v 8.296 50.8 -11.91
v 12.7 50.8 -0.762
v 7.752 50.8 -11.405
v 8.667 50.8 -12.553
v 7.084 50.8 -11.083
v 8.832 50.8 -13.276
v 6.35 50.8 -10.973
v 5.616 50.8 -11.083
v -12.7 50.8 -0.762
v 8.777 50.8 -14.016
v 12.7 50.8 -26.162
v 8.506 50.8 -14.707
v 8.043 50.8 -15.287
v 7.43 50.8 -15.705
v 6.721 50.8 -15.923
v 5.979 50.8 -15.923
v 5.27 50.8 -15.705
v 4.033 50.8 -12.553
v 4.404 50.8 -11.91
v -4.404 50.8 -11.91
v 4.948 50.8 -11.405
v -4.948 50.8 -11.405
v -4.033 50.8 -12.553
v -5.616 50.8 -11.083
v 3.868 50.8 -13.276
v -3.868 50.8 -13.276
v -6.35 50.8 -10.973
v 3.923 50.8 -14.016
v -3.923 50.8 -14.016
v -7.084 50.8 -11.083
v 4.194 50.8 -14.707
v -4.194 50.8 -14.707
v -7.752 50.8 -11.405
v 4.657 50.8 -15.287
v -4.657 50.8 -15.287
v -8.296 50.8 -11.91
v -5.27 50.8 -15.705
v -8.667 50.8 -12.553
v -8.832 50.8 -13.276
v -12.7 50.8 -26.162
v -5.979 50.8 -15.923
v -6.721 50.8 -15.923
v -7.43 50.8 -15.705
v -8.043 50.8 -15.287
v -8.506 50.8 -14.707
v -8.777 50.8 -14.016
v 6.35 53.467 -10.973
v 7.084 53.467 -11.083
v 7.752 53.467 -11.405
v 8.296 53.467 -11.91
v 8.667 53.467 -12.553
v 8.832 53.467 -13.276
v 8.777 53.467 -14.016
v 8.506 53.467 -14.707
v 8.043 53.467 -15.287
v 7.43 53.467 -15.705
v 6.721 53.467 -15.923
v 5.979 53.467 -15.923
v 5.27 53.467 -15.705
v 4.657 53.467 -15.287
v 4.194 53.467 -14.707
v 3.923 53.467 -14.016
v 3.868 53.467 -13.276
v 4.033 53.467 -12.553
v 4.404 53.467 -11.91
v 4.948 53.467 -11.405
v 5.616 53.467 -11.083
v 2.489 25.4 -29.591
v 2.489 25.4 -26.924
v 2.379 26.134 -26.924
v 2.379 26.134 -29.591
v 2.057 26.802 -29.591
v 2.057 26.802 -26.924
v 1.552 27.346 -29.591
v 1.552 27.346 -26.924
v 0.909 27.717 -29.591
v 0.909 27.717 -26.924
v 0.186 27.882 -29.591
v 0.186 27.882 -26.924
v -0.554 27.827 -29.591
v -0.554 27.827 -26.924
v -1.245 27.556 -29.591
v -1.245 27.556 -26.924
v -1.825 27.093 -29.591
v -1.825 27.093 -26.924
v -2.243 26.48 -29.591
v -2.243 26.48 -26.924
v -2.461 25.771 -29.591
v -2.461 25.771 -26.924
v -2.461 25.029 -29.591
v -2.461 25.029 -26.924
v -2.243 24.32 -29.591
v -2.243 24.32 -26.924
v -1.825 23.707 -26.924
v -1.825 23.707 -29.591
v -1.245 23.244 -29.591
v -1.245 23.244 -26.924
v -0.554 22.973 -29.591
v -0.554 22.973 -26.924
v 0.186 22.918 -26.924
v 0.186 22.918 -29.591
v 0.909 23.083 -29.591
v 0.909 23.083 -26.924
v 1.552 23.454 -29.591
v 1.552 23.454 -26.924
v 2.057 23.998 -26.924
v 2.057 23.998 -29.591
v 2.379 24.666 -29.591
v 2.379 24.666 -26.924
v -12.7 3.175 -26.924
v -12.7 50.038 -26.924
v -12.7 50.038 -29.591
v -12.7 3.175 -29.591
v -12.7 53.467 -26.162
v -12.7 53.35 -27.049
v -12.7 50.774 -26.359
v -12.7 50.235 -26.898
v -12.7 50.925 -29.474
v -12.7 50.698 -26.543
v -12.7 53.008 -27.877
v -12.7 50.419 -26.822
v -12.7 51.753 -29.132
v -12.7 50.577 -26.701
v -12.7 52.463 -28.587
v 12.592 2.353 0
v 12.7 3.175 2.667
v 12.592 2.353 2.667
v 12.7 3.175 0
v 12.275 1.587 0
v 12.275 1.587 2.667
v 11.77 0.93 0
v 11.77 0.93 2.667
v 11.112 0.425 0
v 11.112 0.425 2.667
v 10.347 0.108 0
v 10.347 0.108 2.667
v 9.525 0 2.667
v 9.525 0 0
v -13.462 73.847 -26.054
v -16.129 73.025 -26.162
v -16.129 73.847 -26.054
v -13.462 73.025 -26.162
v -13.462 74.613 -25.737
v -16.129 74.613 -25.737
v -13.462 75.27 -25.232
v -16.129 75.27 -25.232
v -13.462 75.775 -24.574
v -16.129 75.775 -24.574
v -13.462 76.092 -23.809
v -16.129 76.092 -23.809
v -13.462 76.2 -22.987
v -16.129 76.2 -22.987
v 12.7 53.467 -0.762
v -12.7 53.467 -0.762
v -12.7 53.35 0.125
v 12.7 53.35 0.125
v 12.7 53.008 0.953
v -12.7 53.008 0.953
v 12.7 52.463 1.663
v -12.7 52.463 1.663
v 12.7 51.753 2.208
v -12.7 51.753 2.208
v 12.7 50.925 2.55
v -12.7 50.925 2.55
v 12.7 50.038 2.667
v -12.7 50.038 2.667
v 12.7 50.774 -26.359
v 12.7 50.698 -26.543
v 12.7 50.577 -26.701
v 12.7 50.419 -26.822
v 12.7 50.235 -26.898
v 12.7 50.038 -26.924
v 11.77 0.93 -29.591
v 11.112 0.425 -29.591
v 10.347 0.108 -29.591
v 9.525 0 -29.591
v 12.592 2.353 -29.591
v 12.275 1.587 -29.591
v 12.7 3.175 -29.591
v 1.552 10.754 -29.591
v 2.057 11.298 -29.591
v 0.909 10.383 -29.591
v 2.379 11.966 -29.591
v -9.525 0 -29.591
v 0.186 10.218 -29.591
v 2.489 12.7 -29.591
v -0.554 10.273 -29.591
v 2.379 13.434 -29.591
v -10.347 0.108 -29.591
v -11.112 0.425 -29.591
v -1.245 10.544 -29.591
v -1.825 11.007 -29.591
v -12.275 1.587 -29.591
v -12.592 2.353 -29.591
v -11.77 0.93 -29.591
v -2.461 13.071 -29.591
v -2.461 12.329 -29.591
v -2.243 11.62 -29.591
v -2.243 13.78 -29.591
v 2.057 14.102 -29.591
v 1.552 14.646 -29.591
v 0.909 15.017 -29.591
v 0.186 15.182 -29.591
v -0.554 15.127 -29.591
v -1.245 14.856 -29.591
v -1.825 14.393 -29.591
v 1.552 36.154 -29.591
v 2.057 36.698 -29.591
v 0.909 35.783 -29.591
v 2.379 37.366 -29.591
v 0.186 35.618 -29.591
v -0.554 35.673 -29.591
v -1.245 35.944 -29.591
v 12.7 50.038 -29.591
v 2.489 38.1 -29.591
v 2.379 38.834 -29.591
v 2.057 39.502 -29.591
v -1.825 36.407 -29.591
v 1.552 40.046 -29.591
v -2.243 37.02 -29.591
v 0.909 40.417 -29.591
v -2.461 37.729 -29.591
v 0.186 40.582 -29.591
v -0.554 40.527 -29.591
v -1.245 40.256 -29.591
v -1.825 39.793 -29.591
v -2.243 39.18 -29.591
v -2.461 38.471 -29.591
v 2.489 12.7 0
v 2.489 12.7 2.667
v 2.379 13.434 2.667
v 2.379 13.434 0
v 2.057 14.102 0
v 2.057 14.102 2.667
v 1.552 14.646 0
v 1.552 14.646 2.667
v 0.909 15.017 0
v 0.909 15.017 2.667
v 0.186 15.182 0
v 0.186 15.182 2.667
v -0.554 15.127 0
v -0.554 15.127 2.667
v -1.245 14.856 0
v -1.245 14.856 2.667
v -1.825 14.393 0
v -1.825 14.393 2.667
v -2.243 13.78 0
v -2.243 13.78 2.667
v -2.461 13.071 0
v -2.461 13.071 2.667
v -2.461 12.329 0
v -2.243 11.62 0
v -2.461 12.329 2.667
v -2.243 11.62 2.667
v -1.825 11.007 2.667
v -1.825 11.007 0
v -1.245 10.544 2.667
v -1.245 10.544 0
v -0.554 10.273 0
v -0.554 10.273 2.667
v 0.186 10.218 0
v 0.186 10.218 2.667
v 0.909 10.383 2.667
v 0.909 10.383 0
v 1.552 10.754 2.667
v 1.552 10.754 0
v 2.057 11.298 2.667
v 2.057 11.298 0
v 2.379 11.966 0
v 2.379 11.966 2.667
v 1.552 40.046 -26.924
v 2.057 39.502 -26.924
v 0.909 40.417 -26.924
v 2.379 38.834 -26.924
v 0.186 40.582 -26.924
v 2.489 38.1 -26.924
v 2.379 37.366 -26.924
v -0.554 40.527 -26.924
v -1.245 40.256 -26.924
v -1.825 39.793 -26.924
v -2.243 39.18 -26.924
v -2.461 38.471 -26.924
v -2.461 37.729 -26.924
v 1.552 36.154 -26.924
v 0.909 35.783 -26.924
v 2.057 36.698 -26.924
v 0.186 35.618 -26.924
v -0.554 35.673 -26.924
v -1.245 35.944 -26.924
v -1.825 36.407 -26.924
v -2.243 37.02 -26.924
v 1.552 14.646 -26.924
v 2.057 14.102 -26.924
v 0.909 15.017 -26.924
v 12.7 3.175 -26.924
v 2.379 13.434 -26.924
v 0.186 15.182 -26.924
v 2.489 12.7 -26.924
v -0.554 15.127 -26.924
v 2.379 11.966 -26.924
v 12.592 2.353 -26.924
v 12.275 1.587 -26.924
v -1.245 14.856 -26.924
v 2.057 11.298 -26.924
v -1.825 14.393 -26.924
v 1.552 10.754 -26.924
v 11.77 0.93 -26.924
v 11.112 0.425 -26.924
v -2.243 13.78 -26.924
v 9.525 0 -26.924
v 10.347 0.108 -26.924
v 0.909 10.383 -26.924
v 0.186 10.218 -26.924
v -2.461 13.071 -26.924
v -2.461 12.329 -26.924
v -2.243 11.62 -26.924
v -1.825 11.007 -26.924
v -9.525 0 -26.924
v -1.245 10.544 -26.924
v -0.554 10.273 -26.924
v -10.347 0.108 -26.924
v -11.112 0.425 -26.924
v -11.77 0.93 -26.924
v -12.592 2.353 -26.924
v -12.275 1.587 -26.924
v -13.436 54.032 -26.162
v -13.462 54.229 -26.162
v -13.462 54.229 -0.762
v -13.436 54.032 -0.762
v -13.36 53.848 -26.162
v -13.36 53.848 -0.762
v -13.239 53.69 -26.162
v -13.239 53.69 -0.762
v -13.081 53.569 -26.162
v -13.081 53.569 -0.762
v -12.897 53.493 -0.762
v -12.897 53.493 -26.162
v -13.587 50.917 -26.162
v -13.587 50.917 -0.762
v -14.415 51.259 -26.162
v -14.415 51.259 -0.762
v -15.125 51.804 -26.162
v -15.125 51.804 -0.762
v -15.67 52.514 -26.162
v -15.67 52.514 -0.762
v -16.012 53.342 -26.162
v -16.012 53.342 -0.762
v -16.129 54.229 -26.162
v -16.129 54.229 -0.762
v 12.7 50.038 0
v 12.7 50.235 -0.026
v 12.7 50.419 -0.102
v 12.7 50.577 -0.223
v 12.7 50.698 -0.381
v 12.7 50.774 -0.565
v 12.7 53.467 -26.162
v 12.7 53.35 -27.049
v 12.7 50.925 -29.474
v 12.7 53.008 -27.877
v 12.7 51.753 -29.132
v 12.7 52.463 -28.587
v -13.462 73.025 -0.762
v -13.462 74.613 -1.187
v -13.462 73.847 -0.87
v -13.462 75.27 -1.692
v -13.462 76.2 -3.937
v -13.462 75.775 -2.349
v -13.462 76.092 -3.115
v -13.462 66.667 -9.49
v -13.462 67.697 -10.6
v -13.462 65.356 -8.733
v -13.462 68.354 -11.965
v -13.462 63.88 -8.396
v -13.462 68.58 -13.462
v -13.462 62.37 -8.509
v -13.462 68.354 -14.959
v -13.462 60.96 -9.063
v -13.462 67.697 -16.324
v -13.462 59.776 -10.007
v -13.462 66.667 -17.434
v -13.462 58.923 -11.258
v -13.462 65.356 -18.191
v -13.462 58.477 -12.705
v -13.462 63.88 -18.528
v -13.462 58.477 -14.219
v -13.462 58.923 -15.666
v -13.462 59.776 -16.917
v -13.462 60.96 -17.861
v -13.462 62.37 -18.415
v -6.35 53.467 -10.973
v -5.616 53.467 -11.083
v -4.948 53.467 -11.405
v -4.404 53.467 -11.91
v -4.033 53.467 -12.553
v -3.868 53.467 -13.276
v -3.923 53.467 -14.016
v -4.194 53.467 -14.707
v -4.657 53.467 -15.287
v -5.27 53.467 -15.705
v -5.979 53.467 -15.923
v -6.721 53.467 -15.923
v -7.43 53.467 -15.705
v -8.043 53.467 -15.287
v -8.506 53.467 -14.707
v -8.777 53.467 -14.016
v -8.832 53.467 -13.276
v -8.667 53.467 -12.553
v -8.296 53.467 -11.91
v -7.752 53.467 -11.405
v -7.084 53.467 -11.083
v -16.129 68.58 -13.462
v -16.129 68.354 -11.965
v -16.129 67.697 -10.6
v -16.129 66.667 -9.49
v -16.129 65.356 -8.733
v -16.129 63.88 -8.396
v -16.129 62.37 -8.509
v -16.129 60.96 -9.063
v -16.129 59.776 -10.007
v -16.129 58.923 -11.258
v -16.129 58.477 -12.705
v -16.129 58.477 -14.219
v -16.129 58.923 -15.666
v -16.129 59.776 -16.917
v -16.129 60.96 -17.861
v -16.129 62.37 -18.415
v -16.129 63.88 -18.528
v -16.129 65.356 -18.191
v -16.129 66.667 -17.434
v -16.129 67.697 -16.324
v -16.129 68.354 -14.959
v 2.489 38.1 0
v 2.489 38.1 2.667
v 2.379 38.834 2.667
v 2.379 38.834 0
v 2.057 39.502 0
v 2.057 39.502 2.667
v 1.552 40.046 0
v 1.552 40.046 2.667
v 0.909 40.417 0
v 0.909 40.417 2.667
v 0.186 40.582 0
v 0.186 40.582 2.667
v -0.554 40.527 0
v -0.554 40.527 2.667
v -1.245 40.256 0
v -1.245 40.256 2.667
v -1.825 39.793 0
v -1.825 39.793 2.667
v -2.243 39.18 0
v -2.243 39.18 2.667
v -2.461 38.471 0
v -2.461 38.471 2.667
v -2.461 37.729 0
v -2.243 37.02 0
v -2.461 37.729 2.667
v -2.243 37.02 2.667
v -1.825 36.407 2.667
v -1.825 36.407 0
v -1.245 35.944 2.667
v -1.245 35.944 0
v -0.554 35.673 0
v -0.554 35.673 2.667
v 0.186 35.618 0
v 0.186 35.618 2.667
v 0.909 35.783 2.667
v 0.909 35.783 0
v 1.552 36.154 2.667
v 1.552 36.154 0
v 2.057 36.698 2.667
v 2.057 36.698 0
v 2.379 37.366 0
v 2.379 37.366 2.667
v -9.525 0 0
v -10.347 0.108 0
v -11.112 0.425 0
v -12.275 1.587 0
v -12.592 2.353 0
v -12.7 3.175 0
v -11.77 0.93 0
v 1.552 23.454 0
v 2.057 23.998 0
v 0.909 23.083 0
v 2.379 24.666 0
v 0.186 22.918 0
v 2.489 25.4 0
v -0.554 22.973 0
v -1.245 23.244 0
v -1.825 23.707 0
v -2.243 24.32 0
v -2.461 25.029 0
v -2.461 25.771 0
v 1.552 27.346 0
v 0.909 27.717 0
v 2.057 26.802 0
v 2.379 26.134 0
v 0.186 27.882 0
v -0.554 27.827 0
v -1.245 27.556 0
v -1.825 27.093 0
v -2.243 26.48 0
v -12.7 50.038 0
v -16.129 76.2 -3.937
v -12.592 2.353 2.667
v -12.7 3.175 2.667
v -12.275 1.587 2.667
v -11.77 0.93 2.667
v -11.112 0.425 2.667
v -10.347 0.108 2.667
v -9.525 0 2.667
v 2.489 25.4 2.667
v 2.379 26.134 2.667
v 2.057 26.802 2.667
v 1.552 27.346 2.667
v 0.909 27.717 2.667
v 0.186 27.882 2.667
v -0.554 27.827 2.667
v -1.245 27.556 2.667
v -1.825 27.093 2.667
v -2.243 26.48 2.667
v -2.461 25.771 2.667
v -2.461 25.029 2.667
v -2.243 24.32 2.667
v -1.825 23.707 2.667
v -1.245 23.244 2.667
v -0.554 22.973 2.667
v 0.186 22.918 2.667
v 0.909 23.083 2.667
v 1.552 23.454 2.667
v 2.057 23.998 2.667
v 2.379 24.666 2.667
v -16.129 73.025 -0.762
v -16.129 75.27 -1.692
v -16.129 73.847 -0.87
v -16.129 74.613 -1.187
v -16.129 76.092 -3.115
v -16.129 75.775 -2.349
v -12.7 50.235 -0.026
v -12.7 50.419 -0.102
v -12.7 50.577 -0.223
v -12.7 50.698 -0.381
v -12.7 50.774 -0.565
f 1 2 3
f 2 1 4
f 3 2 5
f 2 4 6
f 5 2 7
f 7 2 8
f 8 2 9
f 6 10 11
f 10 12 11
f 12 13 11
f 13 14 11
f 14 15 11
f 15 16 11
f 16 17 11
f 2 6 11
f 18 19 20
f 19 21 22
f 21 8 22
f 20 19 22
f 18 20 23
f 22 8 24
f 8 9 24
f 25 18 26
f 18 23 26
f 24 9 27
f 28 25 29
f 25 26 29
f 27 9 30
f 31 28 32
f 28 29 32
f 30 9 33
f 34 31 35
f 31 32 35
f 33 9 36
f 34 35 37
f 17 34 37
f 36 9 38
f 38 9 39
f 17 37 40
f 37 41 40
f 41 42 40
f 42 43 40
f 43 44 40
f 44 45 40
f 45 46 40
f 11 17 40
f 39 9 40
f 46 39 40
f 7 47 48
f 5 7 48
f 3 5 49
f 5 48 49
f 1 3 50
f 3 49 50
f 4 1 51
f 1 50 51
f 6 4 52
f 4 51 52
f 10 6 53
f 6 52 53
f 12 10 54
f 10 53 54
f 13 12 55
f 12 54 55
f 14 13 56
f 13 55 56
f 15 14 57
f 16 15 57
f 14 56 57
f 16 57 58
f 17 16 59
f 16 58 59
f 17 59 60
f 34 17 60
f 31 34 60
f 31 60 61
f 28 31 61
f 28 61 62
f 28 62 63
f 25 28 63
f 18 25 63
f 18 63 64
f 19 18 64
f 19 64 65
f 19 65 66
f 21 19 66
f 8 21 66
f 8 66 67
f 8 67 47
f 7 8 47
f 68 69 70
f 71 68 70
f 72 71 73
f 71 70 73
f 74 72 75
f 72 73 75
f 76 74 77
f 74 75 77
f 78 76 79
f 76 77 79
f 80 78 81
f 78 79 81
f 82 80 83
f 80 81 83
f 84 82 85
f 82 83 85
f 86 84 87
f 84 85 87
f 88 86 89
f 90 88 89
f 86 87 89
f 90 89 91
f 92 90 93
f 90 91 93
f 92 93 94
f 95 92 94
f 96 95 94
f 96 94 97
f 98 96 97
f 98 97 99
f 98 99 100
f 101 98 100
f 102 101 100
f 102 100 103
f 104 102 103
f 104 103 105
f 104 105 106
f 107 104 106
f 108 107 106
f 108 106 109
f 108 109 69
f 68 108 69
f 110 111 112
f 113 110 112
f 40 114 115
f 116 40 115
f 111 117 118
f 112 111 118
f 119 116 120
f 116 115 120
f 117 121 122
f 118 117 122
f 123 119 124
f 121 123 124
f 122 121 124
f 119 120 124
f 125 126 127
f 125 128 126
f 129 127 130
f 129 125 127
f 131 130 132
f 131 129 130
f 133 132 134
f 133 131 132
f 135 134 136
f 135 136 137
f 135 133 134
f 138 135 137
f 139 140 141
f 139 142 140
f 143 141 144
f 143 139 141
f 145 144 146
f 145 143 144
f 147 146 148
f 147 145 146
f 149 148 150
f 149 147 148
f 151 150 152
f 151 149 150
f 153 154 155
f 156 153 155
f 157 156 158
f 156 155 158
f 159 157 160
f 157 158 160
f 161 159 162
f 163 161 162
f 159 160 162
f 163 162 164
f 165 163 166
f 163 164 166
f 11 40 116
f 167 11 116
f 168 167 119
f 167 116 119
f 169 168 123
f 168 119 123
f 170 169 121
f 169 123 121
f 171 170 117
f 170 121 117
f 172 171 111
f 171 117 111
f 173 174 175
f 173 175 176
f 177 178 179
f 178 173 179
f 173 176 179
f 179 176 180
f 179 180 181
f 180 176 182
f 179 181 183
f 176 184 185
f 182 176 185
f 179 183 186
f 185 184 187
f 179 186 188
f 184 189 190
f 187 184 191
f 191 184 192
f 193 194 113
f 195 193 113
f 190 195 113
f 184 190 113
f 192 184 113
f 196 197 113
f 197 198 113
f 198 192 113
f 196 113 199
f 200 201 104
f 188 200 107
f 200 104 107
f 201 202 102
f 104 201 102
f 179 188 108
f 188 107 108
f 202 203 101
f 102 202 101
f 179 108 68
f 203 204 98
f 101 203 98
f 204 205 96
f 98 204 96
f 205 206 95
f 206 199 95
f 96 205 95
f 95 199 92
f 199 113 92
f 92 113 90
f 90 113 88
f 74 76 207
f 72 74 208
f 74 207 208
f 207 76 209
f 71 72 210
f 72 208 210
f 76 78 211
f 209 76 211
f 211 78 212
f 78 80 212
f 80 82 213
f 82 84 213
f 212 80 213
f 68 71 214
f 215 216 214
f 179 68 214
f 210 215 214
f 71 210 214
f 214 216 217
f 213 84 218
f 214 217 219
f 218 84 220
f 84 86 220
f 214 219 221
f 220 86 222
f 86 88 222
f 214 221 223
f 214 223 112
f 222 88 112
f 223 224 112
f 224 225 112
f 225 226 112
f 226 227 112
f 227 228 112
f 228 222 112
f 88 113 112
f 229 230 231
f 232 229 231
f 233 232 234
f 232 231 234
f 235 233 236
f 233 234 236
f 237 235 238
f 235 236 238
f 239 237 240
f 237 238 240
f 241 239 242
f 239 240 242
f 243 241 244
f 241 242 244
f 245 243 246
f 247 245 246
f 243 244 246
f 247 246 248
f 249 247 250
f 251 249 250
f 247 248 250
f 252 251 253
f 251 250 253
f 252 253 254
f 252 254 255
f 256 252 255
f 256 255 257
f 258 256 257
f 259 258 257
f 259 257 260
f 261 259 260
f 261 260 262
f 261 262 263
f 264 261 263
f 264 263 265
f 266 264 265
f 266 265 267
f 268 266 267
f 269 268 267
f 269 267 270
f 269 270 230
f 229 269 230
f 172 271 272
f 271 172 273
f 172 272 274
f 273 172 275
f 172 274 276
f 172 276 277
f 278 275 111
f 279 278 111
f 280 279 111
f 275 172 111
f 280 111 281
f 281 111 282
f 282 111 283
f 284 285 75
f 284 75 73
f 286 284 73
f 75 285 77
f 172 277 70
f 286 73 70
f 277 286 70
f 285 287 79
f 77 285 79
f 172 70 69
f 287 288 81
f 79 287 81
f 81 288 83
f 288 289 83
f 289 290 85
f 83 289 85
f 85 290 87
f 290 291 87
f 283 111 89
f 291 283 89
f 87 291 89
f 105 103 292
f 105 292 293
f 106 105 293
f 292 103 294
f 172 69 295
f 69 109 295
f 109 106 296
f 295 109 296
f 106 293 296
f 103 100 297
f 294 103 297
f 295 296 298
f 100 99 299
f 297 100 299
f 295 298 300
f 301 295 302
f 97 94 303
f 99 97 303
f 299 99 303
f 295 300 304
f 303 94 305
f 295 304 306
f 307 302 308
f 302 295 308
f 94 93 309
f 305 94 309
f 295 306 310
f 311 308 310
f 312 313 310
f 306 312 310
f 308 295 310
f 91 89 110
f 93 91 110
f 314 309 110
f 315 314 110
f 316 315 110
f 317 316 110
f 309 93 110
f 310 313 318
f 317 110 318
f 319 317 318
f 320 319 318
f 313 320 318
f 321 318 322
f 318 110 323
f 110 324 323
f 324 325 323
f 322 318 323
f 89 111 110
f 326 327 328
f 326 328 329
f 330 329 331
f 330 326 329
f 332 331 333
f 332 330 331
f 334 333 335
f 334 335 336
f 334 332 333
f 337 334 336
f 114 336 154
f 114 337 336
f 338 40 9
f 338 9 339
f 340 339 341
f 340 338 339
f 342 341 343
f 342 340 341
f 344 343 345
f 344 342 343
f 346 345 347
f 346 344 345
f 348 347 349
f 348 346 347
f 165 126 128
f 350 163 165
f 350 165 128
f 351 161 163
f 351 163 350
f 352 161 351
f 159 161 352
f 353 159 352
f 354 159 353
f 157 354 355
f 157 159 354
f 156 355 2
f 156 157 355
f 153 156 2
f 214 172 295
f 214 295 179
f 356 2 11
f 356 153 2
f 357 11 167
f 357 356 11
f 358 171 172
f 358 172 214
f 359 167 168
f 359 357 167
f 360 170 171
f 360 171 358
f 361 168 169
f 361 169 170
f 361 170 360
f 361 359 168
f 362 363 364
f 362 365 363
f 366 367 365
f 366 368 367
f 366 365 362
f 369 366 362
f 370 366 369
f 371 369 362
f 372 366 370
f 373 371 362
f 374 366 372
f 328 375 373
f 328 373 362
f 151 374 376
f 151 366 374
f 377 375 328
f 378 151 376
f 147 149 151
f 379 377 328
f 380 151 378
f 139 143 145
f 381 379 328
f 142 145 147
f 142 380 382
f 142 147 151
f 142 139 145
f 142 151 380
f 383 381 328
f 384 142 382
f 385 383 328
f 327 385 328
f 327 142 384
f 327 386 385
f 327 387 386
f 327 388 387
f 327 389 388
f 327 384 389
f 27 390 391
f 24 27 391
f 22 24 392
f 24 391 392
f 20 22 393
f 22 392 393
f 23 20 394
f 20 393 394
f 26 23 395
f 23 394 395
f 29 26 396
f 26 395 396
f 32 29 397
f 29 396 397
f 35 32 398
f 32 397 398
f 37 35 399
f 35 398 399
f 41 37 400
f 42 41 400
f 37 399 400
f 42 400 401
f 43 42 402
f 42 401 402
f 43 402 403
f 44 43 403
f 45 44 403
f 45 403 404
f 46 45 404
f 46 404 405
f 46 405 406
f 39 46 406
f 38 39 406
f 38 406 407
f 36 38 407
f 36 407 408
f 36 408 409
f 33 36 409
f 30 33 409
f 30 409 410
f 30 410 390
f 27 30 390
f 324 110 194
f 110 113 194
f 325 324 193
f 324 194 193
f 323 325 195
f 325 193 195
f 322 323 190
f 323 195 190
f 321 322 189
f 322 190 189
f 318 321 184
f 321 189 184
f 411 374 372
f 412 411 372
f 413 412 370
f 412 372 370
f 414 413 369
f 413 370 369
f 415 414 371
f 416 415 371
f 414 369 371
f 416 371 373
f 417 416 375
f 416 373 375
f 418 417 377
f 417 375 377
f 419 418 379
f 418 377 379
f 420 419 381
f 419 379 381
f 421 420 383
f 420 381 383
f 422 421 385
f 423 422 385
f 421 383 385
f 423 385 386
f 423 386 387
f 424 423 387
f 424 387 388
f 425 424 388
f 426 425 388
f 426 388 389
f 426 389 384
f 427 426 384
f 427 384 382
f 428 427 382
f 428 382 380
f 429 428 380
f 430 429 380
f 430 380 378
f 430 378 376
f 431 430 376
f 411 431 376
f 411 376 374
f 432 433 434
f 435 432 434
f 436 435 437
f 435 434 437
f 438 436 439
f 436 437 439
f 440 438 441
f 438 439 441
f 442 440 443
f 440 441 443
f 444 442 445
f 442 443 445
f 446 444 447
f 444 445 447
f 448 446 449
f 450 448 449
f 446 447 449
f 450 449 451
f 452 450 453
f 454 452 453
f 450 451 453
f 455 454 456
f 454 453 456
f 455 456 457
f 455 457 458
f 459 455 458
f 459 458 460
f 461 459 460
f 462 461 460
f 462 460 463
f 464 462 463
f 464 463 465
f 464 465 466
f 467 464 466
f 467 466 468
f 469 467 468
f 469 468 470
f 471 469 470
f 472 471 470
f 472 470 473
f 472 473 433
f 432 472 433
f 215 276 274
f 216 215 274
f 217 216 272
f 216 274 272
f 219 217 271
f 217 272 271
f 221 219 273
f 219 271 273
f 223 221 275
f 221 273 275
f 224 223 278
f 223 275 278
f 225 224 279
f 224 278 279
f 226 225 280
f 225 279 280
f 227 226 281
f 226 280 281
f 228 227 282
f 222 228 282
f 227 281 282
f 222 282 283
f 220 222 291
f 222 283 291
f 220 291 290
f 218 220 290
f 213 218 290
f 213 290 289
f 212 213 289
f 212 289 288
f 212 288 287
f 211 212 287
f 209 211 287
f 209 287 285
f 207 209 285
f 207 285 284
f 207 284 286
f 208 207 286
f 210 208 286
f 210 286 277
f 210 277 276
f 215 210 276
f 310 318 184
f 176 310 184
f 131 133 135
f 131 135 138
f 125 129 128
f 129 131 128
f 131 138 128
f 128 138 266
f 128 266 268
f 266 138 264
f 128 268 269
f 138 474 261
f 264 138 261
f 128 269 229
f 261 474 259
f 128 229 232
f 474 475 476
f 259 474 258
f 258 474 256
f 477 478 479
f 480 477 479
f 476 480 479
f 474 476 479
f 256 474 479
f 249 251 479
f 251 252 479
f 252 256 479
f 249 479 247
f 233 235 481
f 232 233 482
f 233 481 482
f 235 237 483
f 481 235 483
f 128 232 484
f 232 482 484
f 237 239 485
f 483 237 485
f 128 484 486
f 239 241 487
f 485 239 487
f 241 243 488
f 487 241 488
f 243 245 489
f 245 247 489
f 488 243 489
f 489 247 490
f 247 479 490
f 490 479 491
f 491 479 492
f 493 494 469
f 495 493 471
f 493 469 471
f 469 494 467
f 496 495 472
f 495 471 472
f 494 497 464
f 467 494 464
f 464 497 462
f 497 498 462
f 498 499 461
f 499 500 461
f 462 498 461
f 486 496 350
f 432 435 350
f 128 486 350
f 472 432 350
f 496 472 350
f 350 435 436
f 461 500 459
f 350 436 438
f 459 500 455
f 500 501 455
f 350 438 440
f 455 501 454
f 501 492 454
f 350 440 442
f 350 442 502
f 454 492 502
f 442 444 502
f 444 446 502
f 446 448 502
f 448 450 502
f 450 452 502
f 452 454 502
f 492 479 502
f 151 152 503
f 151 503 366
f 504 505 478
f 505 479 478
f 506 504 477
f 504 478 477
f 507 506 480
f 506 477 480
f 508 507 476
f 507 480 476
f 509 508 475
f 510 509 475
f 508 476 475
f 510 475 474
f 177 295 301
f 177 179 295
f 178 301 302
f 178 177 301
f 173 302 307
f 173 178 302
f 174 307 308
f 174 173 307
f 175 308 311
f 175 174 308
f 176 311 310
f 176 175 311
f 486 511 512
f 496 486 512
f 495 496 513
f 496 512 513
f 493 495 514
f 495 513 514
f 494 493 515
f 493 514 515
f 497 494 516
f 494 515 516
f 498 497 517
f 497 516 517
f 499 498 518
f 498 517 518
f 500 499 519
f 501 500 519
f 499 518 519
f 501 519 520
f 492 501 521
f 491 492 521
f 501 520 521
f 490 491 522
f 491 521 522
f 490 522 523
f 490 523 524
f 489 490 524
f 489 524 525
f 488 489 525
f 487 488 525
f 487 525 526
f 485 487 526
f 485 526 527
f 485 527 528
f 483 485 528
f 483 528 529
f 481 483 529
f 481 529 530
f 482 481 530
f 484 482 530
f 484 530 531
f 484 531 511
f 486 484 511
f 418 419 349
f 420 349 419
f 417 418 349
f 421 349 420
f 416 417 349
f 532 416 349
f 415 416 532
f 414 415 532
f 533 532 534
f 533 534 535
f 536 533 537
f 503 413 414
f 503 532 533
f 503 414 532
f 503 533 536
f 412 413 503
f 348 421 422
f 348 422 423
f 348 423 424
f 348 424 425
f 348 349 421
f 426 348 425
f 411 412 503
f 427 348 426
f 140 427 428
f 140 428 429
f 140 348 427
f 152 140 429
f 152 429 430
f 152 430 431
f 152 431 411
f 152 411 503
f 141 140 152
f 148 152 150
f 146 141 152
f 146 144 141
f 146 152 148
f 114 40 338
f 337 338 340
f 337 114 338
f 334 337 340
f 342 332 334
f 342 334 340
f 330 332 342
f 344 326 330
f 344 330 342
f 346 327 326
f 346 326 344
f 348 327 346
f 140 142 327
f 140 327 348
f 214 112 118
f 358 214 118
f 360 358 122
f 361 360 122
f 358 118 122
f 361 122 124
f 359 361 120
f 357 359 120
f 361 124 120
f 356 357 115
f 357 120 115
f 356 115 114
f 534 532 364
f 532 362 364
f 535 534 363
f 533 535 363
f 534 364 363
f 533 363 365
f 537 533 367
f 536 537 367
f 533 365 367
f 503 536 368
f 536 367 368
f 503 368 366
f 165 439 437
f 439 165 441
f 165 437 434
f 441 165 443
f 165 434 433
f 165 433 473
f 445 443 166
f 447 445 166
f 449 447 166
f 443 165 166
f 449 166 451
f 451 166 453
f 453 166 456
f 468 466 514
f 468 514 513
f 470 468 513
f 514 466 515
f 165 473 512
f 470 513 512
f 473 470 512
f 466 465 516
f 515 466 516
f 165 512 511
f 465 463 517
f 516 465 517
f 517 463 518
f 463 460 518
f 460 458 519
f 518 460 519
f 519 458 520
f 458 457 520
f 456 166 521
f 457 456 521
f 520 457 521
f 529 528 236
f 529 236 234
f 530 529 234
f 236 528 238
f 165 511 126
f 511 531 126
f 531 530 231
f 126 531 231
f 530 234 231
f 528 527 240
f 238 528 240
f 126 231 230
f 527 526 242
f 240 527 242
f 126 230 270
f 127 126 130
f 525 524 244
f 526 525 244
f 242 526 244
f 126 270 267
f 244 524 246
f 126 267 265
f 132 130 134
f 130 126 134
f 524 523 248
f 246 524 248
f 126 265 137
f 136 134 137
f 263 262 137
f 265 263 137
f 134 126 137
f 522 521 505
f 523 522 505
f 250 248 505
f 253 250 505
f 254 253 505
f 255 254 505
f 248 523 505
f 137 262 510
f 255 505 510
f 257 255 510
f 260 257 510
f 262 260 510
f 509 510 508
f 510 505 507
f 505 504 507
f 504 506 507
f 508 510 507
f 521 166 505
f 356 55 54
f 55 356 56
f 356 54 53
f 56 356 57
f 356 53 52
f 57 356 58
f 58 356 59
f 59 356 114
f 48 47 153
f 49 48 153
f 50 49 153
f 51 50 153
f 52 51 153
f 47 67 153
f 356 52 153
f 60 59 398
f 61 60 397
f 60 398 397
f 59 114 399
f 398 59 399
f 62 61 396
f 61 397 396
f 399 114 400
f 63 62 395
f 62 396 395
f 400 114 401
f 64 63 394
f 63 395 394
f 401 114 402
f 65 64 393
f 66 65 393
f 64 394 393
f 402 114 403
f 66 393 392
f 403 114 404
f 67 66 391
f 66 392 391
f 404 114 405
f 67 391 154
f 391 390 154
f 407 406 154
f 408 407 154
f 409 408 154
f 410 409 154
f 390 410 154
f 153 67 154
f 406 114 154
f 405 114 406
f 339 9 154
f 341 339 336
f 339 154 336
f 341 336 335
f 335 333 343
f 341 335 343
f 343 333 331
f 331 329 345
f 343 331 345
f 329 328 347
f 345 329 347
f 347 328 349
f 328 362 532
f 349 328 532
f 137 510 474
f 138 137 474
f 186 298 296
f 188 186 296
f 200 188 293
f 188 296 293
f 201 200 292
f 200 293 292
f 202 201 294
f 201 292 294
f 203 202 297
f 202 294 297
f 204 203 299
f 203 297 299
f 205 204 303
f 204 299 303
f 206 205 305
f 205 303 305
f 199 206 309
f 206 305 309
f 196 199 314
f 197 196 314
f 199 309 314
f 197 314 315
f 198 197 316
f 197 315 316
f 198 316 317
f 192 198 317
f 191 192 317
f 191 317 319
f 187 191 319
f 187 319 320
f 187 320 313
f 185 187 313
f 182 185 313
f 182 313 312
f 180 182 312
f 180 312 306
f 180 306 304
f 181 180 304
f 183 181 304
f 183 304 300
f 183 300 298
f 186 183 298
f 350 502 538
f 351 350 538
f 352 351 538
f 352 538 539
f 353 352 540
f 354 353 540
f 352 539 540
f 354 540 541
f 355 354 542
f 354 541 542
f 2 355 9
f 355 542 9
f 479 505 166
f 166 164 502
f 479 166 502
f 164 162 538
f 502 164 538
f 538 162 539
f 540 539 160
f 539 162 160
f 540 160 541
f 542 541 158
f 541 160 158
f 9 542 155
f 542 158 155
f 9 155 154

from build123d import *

# Parameters (mm, degrees)
BASE_FLANGE1_START = -12.7
BASE_FLANGE1_DEPTH = 25.4
EDGE_FLANGE1_DEPTH = 25.4
SKETCH9_R          = 5.08
CUT_EXTRUDE1_DEPTH = 86.828419099
SKETCH10_R         = 2.4892
CUT_EXTRUDE2_DEPTH = 85.303992818
CUT_EXTRUDE3_REACH = 65.202
SKETCH11_R         = 2.4892
FILLET1_R          = 3.175


# Read off the part's stored shape, not the designer's step: Base-Flange1
# Sheet-metal steps are written as plain solids
with BuildPart() as part:
    # Base-Flange1 outline → Base-Flange1 (new body)
    with BuildSketch(Plane(origin=(0, 0, 0), x_dir=(0, 0, -1), z_dir=(1, 0, 0)).offset(BASE_FLANGE1_START)):
        with BuildLine():
            Line((26.924, 50.038), (26.924, 0))
            Line((26.924, 0), (29.591, 0))
            Line((29.591, 0), (29.591, 50.038))
            ThreePointArc((29.591, 50.038), (28.586669153, 52.462669153), (26.162, 53.467))
            Line((26.162, 53.467), (0.762, 53.467))
            ThreePointArc((0.762, 53.467), (-1.662669153, 52.462669153), (-2.667, 50.038))
            Line((-2.667, 50.038), (-2.667, 0))
            Line((-2.667, 0), (0, 0))
            Line((0, 0), (0, 50.038))
            ThreePointArc((0, 50.038), (0.223184633, 50.576815367), (0.762, 50.8))
            Line((0.762, 50.8), (26.162, 50.8))
            ThreePointArc((26.162, 50.8), (26.700815367, 50.576815367), (26.924, 50.038))
        make_face()
    extrude(amount=BASE_FLANGE1_DEPTH)

    # Edge-Flange1 section (across the edge) → Edge-Flange1 (add)
    with BuildSketch(Plane(origin=(-13.462, 53.467, -26.162), x_dir=(1, 0, 0), z_dir=(0, 0, 1))):
        with BuildLine():
            Line((-2.667, 0.762), (-2.667, 22.733))
            Line((-2.667, 22.733), (0, 22.733))
            Line((0, 22.733), (0, 0.762))
            ThreePointArc((0, 0.762), (0.223184633, 0.223184633), (0.762, 0))
            Line((0.762, 0), (0.762, -2.667))
            ThreePointArc((0.762, -2.667), (-1.662669153, -1.662669153), (-2.667, 0.762))
        make_face()
    extrude(amount=EDGE_FLANGE1_DEPTH)

    # Sketch9 → Cut-Extrude1 (cut, through all)
    with BuildSketch(Plane(origin=(-13.462, 0, 0), x_dir=(0, 0, -1), z_dir=(1, 0, 0))):
        with Locations(Location((13.462, 63.5, 0), (0, 0, 90))):
            Circle(SKETCH9_R)
    extrude(amount=-CUT_EXTRUDE1_DEPTH, mode=Mode.SUBTRACT)

    # Sketch10 → Cut-Extrude2 (cut, through all)
    with BuildSketch(Plane.XY.offset(2.667)):
        with Locations((0, 12.7)):
            Circle(SKETCH10_R)
        with Locations((0, 25.4)):
            Circle(SKETCH10_R)
        with Locations((0, 38.1)):
            Circle(SKETCH10_R)
    extrude(amount=-CUT_EXTRUDE2_DEPTH, mode=Mode.SUBTRACT)

    # Sketch11 → Cut-Extrude3 (cut, up to next)
    with BuildSketch(Plane(origin=(0, 53.467, 0), x_dir=(1, 0, 0), z_dir=(0, 1, 0)), mode=Mode.PRIVATE) as cut_extrude3_sk1:
        with Locations(Location((-6.35, 13.462, 0), (0, 0, 270))):
            Circle(SKETCH11_R)
    cut_extrude3_tool1 = extrude(cut_extrude3_sk1.sketch, amount=-CUT_EXTRUDE3_REACH, mode=Mode.PRIVATE) & part.part
    # Sketch11 → Cut-Extrude3 (cut, up to next)
    with BuildSketch(Plane(origin=(0, 53.467, 0), x_dir=(1, 0, 0), z_dir=(0, 1, 0)), mode=Mode.PRIVATE) as cut_extrude3_sk2:
        with Locations(Location((6.35, 13.462, 0), (0, 0, 270))):
            Circle(SKETCH11_R)
    cut_extrude3_tool2 = extrude(cut_extrude3_sk2.sketch, amount=-CUT_EXTRUDE3_REACH, mode=Mode.PRIVATE) & part.part
    add(cut_extrude3_tool1.solids().sort_by_distance((-6.35, 53.467, -13.462))[0], mode=Mode.SUBTRACT)
    add(cut_extrude3_tool2.solids().sort_by_distance((6.35, 53.467, -13.462))[0], mode=Mode.SUBTRACT)

    # Fillet1
    fillet1_edges = [part.edges().sort_by_distance(p)[0] for p in [
        (-12.7, 0, 1.3335),
        (-12.7, 0, -28.2575),
        (12.7, 0, 1.3335),
        (-14.7955, 76.2, -26.162),
        (-14.7955, 76.2, -0.762),
        (12.7, 0, -28.2575),
    ]]
    fillet(fillet1_edges, radius=FILLET1_R)


solid = part.part
